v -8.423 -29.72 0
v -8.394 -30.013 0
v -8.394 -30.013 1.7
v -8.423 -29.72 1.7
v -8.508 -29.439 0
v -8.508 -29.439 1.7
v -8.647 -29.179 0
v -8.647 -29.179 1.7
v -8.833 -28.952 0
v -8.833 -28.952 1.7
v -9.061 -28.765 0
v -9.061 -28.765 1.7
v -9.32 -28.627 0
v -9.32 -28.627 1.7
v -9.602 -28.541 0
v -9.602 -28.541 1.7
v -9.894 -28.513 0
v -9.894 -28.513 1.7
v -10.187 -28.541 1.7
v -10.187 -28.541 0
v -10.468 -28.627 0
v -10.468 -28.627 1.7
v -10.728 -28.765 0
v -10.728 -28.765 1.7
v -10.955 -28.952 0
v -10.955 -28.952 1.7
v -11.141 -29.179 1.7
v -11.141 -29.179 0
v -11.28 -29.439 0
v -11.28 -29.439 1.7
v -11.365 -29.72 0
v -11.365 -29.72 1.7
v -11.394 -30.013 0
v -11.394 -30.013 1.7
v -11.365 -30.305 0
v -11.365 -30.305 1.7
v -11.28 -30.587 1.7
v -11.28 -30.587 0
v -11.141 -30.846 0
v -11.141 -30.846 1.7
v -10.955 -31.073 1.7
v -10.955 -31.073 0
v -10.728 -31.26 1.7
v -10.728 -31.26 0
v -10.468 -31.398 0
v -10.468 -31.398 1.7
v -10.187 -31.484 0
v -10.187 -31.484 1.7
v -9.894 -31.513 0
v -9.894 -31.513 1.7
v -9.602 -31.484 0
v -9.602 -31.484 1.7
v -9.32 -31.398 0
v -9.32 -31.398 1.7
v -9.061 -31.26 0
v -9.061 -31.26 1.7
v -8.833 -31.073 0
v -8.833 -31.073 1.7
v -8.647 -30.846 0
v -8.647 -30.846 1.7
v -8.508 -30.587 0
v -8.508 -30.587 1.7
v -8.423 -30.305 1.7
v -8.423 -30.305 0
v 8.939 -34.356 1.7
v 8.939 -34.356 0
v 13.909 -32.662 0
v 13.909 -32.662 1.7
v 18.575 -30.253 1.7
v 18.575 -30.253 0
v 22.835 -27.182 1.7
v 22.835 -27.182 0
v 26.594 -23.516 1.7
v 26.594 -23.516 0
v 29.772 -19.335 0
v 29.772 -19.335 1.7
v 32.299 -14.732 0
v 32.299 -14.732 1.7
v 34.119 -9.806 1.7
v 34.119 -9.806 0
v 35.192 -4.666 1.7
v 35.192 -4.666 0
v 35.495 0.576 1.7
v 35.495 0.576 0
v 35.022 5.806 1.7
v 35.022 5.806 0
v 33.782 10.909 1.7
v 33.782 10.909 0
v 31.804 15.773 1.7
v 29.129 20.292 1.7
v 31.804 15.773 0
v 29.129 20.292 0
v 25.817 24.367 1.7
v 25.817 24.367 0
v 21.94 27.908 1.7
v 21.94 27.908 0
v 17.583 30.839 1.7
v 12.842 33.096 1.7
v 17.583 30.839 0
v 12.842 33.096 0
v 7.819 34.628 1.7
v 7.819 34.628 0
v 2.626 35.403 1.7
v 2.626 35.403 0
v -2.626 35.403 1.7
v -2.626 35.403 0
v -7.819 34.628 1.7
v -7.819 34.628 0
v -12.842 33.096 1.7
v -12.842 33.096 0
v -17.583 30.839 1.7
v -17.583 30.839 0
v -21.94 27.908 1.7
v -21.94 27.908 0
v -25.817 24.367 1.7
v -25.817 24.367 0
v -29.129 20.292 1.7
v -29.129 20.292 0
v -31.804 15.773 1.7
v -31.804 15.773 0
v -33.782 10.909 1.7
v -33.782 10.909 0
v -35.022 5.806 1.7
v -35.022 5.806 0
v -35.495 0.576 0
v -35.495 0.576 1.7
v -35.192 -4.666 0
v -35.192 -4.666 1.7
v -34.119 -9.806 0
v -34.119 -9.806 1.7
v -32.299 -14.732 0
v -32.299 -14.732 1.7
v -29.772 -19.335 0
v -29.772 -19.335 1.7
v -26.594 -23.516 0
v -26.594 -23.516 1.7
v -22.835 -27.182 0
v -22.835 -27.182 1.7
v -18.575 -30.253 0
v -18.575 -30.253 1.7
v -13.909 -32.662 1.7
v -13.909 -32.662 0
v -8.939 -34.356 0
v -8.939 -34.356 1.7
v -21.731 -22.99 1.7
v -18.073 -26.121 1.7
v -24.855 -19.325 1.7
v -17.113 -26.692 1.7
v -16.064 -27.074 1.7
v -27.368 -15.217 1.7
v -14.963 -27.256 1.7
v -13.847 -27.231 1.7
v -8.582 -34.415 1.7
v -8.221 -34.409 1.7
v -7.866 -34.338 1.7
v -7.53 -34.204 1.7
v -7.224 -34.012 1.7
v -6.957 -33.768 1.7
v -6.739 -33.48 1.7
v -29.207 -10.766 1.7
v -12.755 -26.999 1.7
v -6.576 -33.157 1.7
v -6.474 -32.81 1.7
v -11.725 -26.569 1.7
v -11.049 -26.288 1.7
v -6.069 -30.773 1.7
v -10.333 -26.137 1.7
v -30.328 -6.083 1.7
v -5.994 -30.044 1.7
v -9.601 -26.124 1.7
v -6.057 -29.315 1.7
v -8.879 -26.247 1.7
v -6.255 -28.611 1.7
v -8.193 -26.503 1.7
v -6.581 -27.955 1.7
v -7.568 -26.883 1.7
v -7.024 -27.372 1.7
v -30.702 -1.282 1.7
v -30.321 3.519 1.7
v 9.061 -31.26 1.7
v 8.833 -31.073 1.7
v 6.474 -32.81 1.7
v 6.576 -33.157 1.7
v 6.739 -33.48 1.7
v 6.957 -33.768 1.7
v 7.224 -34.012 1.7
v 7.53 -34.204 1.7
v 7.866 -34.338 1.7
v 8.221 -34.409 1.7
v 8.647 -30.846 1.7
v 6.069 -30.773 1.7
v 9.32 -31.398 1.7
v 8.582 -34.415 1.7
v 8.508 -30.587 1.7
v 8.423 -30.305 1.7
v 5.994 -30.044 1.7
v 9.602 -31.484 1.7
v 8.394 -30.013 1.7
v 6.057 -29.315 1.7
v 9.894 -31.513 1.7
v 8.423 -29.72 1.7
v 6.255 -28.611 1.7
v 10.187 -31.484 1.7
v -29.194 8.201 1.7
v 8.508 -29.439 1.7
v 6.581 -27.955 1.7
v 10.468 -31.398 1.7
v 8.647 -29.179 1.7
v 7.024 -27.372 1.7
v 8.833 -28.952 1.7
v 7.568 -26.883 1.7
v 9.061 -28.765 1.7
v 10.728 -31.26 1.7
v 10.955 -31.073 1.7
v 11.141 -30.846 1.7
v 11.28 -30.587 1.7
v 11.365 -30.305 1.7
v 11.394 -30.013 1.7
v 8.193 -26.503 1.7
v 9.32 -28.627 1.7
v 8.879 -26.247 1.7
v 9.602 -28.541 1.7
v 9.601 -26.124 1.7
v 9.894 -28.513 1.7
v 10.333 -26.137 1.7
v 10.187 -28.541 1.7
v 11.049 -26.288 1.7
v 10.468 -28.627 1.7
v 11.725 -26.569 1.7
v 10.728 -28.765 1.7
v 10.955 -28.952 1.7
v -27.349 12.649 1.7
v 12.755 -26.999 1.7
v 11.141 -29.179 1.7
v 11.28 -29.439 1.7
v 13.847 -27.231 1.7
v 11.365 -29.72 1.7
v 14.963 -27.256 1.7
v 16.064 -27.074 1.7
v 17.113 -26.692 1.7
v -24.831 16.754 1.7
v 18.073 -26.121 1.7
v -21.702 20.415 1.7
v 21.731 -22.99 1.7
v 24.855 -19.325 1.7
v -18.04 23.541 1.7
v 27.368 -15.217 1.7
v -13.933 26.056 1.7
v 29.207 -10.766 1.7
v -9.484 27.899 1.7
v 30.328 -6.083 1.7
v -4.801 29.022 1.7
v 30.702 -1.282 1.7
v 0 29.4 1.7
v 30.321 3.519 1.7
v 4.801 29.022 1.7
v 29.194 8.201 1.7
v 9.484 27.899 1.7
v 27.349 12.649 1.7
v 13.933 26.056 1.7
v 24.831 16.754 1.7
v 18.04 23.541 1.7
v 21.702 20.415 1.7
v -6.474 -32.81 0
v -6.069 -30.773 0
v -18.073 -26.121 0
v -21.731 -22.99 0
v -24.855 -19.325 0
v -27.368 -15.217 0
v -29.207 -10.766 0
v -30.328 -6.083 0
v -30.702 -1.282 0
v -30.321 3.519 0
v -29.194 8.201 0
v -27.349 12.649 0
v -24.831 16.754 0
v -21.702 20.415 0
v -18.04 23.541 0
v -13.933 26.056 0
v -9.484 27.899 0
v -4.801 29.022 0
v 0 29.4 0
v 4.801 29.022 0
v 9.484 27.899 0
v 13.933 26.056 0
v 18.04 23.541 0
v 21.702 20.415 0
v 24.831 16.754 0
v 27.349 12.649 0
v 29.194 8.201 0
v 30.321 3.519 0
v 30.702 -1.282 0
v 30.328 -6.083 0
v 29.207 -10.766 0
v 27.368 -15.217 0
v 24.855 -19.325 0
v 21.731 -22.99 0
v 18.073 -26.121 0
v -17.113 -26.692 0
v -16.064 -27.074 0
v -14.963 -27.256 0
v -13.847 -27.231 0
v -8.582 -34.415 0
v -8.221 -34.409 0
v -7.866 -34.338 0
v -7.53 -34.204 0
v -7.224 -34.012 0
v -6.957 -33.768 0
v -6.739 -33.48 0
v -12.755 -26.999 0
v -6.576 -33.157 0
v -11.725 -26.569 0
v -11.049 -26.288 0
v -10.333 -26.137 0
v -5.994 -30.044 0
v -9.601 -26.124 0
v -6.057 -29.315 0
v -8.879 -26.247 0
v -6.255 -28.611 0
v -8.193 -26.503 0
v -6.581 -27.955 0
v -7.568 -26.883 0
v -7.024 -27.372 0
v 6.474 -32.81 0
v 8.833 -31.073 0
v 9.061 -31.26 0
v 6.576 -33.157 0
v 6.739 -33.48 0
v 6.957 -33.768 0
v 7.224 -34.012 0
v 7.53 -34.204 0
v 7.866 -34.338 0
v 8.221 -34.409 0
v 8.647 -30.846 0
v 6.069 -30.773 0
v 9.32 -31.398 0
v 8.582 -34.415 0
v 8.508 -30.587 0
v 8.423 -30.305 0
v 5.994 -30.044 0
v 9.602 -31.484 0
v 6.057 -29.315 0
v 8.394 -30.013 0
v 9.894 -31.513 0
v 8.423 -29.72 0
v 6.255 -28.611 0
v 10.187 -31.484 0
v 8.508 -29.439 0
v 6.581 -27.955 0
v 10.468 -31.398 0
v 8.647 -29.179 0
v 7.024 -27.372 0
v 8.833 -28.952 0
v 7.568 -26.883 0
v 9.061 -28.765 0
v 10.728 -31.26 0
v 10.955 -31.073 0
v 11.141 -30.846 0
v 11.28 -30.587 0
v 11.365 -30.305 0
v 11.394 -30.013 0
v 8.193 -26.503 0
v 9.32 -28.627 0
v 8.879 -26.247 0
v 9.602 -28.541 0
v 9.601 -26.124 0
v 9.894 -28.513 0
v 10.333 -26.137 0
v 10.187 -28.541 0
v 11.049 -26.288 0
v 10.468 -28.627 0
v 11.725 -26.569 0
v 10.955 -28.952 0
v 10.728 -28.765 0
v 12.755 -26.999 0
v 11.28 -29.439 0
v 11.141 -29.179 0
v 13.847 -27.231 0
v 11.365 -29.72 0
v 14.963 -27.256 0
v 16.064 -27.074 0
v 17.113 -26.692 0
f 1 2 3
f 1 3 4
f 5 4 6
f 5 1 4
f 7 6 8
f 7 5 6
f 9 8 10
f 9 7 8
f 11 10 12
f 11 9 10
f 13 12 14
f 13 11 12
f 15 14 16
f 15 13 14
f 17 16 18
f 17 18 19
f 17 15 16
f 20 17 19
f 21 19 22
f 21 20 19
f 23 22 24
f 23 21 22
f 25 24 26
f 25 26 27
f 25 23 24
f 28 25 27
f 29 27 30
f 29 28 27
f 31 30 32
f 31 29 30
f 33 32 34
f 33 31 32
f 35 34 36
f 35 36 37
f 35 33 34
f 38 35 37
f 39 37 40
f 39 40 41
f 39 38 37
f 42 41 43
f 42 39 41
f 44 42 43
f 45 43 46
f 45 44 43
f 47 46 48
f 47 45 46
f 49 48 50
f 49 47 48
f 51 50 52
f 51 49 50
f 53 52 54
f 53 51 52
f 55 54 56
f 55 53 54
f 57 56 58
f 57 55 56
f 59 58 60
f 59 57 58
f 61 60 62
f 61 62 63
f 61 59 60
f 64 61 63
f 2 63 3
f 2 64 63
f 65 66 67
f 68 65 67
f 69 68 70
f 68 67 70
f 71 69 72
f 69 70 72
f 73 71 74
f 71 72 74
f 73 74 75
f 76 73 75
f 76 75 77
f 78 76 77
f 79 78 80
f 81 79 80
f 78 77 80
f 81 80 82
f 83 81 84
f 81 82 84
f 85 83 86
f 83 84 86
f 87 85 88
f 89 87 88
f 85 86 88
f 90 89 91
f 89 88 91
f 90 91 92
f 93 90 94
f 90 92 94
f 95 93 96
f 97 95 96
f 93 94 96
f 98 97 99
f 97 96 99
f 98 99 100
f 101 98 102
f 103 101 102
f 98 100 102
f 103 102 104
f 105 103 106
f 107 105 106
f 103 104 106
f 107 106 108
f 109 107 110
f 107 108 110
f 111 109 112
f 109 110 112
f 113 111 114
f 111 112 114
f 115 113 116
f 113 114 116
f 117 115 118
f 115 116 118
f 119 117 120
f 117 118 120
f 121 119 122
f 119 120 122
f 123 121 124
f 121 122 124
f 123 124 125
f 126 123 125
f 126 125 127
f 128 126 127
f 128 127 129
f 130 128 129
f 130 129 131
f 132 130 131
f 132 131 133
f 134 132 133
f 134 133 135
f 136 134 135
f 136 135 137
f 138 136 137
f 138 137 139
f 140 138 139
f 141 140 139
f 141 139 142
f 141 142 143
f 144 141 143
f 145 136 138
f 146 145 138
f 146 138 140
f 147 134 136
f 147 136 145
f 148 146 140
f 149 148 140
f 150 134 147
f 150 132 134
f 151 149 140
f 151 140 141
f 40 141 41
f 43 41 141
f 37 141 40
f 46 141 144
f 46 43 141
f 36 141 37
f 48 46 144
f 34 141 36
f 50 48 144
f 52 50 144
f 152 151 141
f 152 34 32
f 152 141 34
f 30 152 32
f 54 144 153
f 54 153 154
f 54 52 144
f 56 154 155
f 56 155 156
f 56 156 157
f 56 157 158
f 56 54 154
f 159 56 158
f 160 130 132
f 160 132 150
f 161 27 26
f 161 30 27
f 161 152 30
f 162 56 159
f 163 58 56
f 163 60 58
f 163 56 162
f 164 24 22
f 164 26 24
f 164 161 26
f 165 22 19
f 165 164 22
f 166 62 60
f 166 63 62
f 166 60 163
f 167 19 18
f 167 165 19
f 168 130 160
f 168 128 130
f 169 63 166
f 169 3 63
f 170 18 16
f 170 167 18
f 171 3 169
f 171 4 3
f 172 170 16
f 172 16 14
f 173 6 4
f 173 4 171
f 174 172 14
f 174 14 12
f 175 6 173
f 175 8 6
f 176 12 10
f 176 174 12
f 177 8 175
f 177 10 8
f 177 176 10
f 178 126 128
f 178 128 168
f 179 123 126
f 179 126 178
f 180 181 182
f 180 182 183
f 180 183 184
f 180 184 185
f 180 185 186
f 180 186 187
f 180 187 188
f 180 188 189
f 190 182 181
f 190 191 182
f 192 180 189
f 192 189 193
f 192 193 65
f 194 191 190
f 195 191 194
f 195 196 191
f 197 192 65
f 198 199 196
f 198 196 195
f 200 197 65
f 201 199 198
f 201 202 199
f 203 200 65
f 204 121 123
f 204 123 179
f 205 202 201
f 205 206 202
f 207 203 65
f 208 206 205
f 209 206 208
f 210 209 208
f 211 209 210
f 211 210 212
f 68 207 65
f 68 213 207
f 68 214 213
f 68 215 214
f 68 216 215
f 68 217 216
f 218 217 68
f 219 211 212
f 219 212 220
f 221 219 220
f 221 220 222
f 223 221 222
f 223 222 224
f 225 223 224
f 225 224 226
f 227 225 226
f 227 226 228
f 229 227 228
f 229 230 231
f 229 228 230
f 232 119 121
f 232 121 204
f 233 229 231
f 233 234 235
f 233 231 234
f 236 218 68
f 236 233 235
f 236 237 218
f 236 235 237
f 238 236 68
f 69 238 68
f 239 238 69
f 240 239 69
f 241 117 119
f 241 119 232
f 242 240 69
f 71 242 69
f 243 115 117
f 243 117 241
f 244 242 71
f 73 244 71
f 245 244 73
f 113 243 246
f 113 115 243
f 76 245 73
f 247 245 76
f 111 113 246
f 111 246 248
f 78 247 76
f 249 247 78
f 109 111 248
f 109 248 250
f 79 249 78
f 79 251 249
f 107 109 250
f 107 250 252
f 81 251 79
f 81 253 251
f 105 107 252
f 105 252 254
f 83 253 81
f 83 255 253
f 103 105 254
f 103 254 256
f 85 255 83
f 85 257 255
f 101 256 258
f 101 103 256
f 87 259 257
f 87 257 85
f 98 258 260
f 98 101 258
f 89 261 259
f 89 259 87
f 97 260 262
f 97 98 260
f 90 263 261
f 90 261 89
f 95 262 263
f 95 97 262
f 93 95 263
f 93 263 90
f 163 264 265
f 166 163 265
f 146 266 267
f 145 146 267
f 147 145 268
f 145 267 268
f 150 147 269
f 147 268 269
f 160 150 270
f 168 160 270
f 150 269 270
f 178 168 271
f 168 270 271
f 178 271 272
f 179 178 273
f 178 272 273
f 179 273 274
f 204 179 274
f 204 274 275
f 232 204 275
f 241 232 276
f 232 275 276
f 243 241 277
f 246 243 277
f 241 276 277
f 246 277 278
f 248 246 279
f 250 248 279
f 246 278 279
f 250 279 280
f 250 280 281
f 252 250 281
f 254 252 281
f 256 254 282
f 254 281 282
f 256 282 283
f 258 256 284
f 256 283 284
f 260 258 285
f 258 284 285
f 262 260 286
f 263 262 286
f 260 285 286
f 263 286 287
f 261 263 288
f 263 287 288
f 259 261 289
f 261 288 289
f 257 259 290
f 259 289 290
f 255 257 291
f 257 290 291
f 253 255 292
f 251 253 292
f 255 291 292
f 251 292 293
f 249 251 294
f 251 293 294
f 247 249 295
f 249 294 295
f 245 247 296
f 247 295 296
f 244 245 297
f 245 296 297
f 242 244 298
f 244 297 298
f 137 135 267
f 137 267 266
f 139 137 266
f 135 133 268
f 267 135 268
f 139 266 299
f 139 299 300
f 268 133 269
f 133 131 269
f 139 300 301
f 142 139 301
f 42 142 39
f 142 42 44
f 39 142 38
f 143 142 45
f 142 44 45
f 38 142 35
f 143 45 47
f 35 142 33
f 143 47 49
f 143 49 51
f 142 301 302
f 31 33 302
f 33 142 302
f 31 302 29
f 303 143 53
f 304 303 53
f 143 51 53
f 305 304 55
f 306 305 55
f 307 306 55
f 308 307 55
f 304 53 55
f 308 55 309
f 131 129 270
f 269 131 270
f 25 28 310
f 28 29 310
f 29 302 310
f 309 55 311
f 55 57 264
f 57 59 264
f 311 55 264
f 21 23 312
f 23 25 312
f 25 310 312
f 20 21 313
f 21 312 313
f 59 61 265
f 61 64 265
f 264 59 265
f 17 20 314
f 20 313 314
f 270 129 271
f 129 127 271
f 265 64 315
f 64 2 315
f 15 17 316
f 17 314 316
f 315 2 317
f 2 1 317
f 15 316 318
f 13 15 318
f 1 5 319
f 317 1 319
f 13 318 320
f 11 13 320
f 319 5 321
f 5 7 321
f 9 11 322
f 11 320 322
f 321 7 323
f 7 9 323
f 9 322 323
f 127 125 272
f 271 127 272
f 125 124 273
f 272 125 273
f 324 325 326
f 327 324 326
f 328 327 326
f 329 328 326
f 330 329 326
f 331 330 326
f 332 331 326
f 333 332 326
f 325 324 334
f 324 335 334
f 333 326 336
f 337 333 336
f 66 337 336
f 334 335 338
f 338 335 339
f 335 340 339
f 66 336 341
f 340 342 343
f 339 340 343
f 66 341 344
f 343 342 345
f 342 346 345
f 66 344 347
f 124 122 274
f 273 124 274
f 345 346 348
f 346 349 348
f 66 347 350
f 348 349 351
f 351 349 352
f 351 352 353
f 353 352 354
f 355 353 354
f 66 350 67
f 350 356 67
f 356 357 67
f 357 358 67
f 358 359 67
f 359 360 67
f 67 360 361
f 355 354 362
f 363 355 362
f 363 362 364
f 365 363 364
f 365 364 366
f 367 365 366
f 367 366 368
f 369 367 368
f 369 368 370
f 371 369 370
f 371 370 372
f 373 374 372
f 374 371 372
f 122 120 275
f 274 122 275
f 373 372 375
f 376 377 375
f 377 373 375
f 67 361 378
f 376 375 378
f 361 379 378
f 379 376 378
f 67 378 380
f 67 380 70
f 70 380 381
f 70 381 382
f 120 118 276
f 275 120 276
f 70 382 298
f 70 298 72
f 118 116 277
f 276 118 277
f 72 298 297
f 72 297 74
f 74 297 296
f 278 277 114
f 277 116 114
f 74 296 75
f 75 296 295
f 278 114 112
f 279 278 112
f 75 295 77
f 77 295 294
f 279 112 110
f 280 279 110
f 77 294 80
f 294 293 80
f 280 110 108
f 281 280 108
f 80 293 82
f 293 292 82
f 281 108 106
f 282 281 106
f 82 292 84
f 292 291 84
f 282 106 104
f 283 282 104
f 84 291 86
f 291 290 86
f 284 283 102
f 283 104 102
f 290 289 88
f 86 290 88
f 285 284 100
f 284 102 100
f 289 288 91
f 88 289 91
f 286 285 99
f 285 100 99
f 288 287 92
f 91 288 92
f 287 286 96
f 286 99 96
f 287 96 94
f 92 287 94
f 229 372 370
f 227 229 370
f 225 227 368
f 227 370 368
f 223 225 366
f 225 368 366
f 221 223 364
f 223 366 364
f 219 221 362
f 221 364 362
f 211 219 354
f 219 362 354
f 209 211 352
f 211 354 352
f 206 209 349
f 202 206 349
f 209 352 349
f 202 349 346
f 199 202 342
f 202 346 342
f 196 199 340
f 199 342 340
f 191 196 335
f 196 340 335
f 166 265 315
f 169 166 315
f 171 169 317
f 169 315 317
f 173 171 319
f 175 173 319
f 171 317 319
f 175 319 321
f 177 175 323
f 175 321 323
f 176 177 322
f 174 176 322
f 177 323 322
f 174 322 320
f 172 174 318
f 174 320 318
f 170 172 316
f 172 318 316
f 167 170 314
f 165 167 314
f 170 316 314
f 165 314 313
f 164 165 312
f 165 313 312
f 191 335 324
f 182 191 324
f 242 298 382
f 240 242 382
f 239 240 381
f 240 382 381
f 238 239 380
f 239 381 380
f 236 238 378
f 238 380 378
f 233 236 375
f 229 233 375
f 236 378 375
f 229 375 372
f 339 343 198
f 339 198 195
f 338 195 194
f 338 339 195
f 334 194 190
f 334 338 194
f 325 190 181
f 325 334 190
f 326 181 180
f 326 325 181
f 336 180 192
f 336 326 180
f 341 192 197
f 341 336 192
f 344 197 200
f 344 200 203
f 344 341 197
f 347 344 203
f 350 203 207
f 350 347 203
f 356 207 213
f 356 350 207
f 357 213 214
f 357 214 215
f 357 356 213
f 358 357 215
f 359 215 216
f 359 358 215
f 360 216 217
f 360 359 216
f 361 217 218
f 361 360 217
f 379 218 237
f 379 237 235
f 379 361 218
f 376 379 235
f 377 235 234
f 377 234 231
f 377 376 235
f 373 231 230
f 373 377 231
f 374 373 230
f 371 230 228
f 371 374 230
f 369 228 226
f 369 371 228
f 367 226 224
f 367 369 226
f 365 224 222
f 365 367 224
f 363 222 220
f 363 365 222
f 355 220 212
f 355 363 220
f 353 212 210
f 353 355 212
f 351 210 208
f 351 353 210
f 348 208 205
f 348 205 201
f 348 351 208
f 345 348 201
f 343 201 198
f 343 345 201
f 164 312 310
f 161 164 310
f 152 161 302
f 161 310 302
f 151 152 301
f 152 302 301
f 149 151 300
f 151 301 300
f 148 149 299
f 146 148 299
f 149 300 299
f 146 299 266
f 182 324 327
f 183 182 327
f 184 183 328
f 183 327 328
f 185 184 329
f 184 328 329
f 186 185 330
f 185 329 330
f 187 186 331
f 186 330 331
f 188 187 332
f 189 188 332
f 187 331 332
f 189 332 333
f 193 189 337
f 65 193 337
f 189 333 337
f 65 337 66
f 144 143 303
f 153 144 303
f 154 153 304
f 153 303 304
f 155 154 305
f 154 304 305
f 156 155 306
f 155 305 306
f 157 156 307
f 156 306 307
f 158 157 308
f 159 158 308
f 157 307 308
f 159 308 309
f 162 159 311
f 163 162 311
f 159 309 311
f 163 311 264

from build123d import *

# Parameters (mm, degrees)
SKETCH_3_R      = 1.5
EXTRUDE_1_DEPTH = 1.7


with BuildPart() as part:
    # Эскиз3 → Бобышка-Вытянуть1 (new body)
    with BuildSketch(Plane.XY):
        with BuildLine():
            Line((-6.473729419, -32.810303411), (-6.068906589, -30.772625658))
            ThreePointArc((-6.068906589, -30.772625658), (-7.567661229, -26.882580179), (-11.724624303, -26.568928632))
            ThreePointArc((-11.724624303, -26.568928632), (-14.962869732, -27.255997351), (-18.072620871, -26.12120894))
            ThreePointArc((-18.072620871, -26.12120894), (0, 29.4), (18.072620871, -26.12120894))
            ThreePointArc((18.072620871, -26.12120894), (14.962869732, -27.255997351), (11.724624303, -26.568928632))
            ThreePointArc((11.724624303, -26.568928632), (7.567661229, -26.882580179), (6.068906589, -30.772625658))
            Line((6.068906589, -30.772625658), (6.473729419, -32.810303411))
            ThreePointArc((6.473729419, -32.810303411), (7.37290154, -34.115019127), (8.938996834, -34.356139707))
            ThreePointArc((8.938996834, -34.356139707), (0, 35.5), (-8.938996834, -34.356139707))
            ThreePointArc((-8.938996834, -34.356139707), (-7.37290154, -34.115019127), (-6.473729419, -32.810303411))
        make_face()
        with Locations((-9.89414741, -30.012669962)):
            Circle(SKETCH_3_R, mode=Mode.SUBTRACT)
        with Locations(Location((9.89414741, -30.012669962, 0), (0, 0, 180))):
            Circle(SKETCH_3_R, mode=Mode.SUBTRACT)
    extrude(amount=EXTRUDE_1_DEPTH)


solid = part.part
